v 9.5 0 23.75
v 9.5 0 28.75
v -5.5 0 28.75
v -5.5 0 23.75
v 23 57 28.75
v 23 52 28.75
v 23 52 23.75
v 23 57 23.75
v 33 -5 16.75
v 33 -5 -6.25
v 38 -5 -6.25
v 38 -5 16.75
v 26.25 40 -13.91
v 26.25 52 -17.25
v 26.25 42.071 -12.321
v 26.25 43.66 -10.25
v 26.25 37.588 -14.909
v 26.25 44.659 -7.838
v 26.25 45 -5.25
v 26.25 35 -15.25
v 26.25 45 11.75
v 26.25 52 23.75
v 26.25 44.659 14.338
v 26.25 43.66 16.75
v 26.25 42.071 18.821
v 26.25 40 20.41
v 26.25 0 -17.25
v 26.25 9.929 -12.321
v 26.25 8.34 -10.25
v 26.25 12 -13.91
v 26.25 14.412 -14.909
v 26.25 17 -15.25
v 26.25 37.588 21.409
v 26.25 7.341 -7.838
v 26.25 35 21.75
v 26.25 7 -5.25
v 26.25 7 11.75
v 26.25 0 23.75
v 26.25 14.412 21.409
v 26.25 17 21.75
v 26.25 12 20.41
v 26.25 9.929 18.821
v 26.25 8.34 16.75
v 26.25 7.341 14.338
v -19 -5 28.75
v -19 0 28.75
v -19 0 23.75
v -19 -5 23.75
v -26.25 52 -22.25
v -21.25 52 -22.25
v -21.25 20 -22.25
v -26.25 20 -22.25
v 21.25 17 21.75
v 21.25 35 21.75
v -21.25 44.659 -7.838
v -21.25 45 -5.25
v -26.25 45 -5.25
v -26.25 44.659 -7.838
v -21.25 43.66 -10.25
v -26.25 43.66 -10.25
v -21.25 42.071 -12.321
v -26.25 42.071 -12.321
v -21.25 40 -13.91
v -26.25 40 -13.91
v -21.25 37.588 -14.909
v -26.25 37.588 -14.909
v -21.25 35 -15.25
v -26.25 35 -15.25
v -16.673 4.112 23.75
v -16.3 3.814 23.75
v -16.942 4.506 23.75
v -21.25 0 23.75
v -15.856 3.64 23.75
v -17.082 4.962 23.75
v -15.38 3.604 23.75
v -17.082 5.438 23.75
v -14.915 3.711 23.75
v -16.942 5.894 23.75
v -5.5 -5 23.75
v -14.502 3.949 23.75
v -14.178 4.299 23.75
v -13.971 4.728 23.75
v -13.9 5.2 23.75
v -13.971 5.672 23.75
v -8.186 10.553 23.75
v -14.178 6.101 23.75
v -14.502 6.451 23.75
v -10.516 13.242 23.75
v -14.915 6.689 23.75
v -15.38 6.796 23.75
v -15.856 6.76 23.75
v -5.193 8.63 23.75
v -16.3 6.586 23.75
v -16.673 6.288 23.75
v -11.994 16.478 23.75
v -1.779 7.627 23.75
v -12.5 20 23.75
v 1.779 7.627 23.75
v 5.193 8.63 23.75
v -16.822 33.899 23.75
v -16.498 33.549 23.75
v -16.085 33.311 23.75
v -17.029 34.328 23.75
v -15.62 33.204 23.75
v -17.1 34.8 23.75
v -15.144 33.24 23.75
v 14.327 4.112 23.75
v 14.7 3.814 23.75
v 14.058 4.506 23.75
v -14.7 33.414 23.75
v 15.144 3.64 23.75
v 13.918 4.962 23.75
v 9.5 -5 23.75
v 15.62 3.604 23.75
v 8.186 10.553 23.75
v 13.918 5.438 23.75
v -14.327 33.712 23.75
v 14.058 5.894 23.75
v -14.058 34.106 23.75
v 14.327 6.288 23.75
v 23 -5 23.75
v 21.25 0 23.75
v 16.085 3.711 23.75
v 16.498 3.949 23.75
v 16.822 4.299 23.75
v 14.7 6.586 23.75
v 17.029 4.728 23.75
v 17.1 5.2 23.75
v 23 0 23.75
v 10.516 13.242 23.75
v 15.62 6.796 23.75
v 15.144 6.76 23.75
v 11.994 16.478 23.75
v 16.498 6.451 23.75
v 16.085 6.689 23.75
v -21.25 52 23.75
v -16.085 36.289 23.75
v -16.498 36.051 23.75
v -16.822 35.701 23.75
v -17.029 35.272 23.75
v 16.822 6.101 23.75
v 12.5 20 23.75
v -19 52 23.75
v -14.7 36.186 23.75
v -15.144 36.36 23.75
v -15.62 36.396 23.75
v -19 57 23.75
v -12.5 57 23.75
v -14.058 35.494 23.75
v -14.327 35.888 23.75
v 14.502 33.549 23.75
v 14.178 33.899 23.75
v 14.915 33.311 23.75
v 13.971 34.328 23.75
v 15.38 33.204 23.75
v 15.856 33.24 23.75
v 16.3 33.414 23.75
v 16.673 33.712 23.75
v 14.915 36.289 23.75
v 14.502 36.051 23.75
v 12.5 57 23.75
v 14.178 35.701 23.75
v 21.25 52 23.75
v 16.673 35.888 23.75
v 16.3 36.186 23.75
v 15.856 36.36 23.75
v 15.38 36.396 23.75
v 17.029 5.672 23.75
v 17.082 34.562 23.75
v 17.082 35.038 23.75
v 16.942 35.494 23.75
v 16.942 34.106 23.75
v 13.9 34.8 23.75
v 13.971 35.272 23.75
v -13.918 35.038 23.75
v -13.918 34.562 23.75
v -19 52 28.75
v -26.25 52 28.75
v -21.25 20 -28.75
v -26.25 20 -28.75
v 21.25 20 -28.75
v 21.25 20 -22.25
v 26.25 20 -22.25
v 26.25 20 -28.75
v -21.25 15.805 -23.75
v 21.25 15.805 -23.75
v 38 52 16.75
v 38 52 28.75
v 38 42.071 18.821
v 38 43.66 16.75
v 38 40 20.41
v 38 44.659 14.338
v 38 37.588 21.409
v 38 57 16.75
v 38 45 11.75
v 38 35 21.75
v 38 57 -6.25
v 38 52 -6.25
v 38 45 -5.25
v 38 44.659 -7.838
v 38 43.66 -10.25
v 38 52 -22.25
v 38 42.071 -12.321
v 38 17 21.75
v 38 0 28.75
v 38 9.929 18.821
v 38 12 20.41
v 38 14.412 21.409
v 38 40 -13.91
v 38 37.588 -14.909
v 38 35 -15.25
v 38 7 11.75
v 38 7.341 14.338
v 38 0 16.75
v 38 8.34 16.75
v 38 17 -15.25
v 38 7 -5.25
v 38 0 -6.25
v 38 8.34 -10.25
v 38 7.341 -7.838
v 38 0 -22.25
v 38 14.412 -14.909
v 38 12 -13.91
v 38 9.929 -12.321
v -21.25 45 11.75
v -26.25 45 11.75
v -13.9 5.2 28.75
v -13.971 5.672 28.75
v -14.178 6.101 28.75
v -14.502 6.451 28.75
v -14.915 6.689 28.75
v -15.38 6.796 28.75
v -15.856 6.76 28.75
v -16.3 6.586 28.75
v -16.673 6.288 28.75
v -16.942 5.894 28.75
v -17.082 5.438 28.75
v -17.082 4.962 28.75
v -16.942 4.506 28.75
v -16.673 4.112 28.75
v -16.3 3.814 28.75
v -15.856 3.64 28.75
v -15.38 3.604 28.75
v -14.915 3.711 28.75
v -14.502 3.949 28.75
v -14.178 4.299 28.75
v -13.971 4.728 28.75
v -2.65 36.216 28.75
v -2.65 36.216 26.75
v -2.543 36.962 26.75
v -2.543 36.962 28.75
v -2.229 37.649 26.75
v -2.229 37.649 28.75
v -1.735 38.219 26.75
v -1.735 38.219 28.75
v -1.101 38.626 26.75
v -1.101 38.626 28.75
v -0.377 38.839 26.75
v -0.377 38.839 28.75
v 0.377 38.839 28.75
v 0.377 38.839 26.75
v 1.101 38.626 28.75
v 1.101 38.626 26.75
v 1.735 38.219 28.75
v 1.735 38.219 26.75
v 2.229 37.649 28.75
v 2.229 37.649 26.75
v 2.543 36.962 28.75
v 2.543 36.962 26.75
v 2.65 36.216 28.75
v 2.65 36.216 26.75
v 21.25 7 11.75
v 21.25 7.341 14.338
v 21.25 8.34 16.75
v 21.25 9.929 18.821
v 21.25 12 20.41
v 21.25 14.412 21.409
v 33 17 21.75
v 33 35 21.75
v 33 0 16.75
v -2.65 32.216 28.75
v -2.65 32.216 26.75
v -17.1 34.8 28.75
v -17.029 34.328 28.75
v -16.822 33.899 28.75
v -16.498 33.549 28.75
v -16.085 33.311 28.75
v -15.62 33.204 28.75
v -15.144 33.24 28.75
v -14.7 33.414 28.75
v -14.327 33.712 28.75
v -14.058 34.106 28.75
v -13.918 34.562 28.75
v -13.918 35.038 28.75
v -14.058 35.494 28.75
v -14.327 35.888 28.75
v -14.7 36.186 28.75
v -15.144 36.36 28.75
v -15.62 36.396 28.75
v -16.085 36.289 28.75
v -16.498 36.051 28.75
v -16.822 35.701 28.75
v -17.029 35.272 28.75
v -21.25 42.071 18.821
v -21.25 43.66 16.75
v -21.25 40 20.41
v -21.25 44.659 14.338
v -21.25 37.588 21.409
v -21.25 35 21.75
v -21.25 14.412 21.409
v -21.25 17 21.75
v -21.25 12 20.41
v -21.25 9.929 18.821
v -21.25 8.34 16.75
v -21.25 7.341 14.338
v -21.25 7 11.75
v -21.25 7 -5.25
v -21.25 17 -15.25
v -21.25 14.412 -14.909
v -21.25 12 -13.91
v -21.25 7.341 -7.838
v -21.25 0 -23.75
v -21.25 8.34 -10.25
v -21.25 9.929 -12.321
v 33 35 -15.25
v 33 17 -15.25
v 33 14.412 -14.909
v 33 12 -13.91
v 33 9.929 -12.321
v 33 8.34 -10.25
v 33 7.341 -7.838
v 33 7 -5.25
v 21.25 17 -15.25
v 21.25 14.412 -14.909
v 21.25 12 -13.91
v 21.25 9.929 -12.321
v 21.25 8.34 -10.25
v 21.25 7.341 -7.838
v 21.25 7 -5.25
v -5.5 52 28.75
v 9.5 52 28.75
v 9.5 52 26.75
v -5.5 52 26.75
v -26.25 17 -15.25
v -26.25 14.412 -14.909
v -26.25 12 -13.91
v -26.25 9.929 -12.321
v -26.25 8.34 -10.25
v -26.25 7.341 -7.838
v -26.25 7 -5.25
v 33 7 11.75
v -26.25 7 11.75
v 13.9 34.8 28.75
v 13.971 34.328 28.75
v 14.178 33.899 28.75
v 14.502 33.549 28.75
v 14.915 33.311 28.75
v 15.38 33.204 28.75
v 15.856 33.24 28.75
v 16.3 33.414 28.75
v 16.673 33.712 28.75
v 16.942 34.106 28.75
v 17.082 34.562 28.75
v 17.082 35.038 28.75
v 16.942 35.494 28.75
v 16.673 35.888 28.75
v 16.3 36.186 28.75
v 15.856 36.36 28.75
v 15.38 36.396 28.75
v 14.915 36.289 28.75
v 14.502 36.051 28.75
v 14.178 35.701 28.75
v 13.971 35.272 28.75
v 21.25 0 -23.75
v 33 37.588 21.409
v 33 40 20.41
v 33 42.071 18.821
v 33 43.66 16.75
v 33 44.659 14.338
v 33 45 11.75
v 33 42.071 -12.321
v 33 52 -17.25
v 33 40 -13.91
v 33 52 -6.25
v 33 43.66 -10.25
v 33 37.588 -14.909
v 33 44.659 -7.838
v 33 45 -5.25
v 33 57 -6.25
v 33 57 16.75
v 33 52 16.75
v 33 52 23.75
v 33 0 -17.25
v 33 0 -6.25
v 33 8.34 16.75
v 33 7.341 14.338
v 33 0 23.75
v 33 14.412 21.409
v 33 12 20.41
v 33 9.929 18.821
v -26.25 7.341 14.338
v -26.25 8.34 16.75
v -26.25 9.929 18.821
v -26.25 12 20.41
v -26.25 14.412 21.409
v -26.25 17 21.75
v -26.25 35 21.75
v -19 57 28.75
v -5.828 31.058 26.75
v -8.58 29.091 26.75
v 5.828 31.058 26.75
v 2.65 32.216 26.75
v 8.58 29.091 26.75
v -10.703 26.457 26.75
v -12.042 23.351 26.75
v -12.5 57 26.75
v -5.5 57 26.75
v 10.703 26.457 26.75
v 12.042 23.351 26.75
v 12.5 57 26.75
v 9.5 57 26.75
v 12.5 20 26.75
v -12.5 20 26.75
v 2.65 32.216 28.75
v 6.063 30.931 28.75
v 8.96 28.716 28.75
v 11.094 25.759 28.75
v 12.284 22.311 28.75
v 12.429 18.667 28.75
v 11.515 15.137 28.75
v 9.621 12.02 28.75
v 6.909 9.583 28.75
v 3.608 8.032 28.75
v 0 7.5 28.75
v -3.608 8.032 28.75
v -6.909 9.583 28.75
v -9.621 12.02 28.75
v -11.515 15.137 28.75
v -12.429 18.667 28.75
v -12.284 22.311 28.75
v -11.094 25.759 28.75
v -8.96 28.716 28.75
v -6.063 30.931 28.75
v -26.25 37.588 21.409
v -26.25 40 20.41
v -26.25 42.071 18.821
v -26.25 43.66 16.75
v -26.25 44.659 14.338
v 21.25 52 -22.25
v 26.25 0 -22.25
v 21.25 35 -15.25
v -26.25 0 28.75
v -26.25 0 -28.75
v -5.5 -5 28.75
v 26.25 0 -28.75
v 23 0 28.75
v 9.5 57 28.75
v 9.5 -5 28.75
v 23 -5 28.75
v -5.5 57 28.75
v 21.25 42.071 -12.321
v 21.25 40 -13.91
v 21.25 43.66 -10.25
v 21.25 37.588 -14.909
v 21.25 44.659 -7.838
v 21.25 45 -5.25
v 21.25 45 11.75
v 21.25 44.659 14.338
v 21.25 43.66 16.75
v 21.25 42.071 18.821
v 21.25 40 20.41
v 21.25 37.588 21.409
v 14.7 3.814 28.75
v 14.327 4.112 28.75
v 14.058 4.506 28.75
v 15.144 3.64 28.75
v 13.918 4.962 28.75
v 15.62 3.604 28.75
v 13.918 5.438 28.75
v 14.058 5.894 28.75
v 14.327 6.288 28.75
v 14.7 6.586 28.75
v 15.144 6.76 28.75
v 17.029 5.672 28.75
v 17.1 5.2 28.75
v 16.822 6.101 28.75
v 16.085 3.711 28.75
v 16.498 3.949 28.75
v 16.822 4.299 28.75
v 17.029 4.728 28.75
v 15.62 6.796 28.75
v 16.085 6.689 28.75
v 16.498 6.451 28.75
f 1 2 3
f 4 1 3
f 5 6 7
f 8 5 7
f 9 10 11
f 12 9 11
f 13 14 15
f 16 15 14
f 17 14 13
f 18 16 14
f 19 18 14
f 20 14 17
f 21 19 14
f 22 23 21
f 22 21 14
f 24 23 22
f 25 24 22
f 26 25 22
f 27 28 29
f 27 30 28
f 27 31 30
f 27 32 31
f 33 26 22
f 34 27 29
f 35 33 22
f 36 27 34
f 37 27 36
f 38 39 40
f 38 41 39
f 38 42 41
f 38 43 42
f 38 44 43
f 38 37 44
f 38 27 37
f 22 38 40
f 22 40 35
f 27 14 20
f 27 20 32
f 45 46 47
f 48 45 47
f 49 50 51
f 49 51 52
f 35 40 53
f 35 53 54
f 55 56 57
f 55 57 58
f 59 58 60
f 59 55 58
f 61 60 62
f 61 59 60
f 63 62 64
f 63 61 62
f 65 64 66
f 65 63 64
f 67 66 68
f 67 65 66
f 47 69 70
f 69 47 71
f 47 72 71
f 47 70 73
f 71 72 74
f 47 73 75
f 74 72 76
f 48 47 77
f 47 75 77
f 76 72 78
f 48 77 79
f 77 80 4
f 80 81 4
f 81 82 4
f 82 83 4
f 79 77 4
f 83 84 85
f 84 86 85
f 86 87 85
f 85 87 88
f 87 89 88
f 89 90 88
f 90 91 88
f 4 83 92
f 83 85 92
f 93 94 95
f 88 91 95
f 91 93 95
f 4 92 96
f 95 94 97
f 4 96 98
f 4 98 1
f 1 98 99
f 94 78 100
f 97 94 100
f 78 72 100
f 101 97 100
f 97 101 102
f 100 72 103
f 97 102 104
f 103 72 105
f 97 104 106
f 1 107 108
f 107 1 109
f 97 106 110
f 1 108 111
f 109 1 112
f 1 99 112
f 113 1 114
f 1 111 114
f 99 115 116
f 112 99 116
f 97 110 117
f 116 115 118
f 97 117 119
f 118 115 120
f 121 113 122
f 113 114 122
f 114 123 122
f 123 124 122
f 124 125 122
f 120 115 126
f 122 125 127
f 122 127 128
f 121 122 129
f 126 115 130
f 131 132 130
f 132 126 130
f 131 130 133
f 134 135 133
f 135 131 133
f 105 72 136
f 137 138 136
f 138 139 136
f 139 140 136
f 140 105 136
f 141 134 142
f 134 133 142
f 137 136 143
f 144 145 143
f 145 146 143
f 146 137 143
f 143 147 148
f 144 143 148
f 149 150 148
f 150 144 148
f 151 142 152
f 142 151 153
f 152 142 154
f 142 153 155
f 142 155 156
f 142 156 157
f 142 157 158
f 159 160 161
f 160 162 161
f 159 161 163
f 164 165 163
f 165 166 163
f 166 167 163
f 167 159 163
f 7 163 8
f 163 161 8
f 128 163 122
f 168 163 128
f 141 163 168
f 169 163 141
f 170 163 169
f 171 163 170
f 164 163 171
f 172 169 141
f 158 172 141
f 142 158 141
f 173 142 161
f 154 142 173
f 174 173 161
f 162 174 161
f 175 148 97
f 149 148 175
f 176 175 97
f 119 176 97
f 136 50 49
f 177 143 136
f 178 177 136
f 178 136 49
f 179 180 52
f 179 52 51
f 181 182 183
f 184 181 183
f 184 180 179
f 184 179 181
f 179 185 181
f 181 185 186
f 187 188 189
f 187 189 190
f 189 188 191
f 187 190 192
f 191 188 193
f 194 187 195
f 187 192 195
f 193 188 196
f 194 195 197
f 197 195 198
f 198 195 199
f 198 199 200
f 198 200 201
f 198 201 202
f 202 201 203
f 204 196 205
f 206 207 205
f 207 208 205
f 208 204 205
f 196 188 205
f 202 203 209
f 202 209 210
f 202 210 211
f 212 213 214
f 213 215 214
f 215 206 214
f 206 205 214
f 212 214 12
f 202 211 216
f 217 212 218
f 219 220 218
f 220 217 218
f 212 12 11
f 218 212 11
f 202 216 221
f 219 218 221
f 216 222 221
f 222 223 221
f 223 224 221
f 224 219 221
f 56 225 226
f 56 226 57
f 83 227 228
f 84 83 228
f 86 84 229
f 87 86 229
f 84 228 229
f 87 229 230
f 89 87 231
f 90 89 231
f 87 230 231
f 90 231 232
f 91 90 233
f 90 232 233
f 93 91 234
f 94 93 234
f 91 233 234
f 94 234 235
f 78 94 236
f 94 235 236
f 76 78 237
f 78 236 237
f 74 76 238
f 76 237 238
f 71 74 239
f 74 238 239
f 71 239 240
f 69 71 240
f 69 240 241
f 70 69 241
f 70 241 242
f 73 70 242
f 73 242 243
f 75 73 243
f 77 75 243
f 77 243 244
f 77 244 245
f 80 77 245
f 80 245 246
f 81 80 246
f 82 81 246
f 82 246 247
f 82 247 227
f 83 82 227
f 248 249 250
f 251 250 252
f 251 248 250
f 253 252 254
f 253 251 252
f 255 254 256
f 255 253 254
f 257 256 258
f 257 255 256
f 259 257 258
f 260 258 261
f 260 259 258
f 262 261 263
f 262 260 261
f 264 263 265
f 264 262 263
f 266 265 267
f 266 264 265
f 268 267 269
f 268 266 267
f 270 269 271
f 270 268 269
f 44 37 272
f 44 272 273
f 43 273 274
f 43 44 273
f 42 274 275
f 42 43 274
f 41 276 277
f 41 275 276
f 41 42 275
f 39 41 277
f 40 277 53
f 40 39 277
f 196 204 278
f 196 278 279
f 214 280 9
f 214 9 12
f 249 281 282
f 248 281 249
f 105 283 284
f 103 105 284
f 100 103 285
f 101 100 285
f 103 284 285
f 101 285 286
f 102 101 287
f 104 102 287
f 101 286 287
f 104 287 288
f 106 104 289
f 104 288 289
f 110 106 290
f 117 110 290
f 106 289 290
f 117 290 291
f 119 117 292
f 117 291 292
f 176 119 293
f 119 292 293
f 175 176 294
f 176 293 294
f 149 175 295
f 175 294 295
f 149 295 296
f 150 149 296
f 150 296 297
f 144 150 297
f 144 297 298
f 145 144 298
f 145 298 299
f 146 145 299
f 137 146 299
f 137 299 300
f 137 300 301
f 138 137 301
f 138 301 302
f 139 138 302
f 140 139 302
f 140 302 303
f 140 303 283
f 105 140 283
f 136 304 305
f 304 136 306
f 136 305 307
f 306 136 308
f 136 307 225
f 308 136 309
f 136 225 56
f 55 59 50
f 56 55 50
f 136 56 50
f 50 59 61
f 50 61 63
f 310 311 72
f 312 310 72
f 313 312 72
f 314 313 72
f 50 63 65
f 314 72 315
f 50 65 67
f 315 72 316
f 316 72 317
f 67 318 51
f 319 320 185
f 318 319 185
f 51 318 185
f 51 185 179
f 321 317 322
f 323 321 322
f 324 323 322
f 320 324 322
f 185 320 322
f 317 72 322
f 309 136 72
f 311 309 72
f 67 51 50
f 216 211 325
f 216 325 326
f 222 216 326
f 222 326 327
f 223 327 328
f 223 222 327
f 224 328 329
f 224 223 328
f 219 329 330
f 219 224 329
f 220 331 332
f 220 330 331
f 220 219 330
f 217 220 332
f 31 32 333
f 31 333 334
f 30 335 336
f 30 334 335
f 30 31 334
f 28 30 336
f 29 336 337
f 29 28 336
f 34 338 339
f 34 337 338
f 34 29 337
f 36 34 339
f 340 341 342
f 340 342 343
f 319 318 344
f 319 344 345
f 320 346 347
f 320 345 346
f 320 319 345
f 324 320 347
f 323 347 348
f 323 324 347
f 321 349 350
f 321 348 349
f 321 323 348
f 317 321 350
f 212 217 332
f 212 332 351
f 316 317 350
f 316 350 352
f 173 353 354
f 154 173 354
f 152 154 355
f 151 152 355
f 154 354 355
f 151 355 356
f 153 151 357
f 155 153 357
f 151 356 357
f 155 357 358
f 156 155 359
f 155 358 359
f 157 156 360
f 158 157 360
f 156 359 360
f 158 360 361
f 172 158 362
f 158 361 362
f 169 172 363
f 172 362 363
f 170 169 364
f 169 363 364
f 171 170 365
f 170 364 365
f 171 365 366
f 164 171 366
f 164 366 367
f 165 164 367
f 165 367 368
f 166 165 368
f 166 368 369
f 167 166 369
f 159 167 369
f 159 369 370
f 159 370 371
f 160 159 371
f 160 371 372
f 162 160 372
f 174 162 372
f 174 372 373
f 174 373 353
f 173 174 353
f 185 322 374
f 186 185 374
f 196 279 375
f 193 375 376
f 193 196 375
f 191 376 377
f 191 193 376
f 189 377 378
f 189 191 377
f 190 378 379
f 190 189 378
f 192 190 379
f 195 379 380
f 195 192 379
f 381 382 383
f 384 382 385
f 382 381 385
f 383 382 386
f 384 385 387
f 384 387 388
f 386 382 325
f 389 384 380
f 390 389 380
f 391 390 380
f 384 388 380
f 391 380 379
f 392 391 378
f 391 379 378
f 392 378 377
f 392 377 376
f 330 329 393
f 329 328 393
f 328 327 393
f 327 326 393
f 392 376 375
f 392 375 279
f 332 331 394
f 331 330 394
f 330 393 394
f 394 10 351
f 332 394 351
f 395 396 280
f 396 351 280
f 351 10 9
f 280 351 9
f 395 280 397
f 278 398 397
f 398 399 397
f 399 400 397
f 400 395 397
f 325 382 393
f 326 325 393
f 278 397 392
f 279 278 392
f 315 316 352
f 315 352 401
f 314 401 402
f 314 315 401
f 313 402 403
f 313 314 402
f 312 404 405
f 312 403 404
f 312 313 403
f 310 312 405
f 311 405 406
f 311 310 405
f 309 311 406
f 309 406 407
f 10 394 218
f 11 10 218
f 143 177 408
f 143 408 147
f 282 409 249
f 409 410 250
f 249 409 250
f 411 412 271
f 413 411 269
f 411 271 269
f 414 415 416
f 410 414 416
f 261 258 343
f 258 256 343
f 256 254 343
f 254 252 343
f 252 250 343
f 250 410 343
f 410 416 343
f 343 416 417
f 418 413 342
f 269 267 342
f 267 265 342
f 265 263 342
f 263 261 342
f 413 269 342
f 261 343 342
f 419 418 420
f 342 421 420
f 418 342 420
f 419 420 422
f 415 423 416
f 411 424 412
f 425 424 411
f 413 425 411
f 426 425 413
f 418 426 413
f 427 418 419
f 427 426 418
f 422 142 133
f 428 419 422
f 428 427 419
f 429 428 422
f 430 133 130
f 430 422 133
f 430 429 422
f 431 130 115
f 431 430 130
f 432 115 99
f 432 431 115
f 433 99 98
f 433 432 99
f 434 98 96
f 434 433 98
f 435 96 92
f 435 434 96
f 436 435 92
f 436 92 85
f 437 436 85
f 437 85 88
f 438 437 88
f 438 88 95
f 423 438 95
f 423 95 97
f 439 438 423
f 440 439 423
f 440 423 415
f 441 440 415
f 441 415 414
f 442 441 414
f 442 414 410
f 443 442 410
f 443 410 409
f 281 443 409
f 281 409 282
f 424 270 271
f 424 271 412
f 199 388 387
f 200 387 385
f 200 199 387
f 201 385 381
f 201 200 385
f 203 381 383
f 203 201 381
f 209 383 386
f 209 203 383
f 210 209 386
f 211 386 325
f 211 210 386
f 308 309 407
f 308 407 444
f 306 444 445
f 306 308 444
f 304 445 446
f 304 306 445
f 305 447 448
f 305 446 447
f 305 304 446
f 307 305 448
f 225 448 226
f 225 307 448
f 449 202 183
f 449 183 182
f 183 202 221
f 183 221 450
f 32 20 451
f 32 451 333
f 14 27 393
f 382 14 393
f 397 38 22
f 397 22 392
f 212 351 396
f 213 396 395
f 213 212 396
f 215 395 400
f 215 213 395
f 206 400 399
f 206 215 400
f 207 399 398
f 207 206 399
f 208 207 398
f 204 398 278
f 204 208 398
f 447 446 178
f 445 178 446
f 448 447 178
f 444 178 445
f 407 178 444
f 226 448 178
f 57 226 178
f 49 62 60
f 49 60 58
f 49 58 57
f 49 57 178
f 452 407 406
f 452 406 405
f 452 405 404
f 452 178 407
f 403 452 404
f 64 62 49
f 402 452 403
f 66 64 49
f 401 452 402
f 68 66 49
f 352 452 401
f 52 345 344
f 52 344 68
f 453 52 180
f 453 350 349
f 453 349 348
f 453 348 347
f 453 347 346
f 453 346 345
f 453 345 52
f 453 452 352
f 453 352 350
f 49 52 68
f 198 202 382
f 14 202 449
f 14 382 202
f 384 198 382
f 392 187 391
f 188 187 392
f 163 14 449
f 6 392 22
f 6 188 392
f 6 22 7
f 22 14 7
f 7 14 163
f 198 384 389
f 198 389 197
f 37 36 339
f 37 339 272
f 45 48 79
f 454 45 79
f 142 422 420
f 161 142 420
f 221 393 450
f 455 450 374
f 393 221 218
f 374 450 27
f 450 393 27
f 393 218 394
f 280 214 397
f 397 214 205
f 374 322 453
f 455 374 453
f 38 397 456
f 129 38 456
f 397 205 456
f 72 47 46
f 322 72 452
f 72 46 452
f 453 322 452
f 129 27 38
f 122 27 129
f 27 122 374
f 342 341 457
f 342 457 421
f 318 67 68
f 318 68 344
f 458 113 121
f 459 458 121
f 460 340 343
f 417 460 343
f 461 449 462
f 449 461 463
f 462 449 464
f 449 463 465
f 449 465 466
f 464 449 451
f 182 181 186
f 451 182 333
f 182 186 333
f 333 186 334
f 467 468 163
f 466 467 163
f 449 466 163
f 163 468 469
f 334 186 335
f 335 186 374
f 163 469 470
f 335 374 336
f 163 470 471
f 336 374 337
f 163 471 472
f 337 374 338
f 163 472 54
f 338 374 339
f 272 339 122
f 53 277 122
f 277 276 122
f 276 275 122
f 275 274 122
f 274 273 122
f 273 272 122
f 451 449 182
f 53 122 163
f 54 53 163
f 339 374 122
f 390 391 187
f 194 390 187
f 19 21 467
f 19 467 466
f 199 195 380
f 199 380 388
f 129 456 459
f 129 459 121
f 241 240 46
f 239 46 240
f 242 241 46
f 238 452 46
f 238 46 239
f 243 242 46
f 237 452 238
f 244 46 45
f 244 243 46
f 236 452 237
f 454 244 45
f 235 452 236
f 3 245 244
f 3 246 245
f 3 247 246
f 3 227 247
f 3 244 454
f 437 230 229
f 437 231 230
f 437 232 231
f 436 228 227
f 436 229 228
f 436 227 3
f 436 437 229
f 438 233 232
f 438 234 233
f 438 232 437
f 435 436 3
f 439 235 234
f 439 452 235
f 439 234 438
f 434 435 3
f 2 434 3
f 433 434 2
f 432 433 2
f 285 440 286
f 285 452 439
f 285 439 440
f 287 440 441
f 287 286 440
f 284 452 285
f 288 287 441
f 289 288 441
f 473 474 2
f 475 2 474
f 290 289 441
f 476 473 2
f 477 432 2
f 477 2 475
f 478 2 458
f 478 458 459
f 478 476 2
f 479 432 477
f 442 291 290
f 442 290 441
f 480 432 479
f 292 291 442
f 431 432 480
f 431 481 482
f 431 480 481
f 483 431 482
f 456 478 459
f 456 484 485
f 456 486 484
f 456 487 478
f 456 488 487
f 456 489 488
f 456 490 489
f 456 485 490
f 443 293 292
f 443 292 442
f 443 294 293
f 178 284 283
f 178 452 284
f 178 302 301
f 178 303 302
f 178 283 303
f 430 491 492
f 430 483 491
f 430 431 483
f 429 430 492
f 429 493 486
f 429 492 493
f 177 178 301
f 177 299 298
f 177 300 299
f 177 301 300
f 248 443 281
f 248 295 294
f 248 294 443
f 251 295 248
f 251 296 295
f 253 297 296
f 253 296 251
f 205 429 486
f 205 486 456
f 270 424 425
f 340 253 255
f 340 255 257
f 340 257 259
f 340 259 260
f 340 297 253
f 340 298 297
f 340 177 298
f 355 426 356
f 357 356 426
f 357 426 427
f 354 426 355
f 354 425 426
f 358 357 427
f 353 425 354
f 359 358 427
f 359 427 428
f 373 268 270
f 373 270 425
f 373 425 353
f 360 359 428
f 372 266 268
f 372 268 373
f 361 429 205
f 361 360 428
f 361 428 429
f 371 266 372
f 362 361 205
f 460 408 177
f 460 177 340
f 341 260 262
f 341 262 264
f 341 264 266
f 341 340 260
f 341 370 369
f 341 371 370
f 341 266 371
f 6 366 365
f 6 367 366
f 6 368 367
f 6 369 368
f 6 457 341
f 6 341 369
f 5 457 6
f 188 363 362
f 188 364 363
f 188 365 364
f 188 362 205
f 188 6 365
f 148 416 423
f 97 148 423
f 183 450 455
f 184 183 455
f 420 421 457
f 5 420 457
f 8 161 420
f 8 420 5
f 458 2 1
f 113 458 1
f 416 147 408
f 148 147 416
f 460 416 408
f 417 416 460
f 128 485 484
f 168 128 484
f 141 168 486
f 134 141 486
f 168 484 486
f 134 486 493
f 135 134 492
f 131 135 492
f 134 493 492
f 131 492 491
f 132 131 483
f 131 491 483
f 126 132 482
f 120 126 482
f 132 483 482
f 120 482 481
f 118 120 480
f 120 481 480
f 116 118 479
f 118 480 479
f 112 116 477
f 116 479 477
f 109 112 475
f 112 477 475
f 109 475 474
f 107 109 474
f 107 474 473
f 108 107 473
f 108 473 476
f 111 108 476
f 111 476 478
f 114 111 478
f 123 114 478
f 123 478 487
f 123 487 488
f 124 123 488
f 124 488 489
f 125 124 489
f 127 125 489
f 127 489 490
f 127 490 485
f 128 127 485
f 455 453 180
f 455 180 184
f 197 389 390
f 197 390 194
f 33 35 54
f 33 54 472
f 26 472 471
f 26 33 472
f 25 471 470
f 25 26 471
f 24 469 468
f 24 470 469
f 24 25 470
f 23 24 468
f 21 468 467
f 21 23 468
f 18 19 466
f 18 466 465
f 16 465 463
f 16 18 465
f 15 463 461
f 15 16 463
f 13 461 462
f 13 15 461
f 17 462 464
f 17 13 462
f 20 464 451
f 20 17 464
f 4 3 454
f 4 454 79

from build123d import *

# Parameters (mm, degrees)
ESQUISSE1_W                  = 52.5
ESQUISSE1_H                  = 57.5
ESQUISSE1_W_2                = 42.5
ESQUISSE1_H_2                = 47.5
EXTRU_MINCE1_DEPTH           = 20
ESQUISSE3_W                  = 6.75
ESQUISSE3_H                  = 41
ESQUISSE3_W_2                = 30.75
BOSS_EXTRU_1_DEPTH           = 52
ESQUISSE6_W                  = 5
ESQUISSE6_H                  = 23
ESQUISSE6_W_2                = 13.5
ESQUISSE6_H_2                = 5
BOSS_EXTRU_3_DEPTH           = 5
ENL_V_MAT_EXTRU_1_REACH      = 103.977
ESQUISSE2_R                  = 1.6
ENL_V_START                  = -3
ENL_V_MAT_EXTRU_2_DEPTH      = 3
ENL_V_MAT_EXTRU_3_DEPTH      = 119.640475808
ENL_V_MAT_EXTRU_4_DEPTH      = 99.458112921
ENL_V_MAT_EXTRU_5_DEPTH      = 89.991923791
ENL_V_MAT_EXTRU_5_DEPTH_BACK = 89.991923791
ESQUISSE10_W                 = 35.75
ESQUISSE10_H                 = 51
CHANFREIN1_SIZE2             = 4.195498156
CHANFREIN1_SIZE              = 5


with BuildPart() as part:
    # Esquisse1 → Extru.-Mince1 (new body)
    with BuildSketch(Plane(origin=(0, 0, 0), x_dir=(1, 0, 0), z_dir=(0, 1, 0))):
        Rectangle(ESQUISSE1_W, ESQUISSE1_H)
        Rectangle(ESQUISSE1_W_2, ESQUISSE1_H_2, mode=Mode.SUBTRACT)
    extrude(amount=EXTRU_MINCE1_DEPTH)

    # Esquisse3 → Boss.-Extru.1 (add)
    with BuildSketch(Plane.XZ):
        Polygon((26.25, 28.75), (38, 28.75), (38, -22.25), (21.25, -22.25), (21.25, 23.75), (-21.25, 23.75), (-21.25, -22.25), (-62, -22.25), (-62, 28.75), (-26.25, 28.75), (0, 28.75), align=None)
        with Locations((29.625, 3.25)):
            Rectangle(ESQUISSE3_W, ESQUISSE3_H, mode=Mode.SUBTRACT)
        with Locations((-41.625, 3.25)):
            Rectangle(ESQUISSE3_W_2, ESQUISSE3_H, mode=Mode.SUBTRACT)
    extrude(amount=-BOSS_EXTRU_1_DEPTH)

    # Esquisse6 → Boss.-Extru.3 (add)
    with BuildSketch(Plane(origin=(0, 52, 0), x_dir=(1, 0, 0), z_dir=(0, 1, 0))):
        with Locations((35.5, -5.25)):
            Rectangle(ESQUISSE6_W, ESQUISSE6_H)
        with Locations((16.25, -26.25)):
            Rectangle(ESQUISSE6_W_2, ESQUISSE6_H_2)
        with Locations((-12.25, -26.25)):
            Rectangle(ESQUISSE6_W_2, ESQUISSE6_H_2)
        with Locations((-40.75, -26.25)):
            Rectangle(ESQUISSE6_W_2, ESQUISSE6_H_2)
        with Locations((-40.75, 19.75)):
            Rectangle(ESQUISSE6_W_2, ESQUISSE6_H_2)
        with Locations((-59.5, -5.25)):
            Rectangle(ESQUISSE6_W, ESQUISSE6_H)
    boss_extru_3 = extrude(amount=BOSS_EXTRU_3_DEPTH)

    # Esquisse2 → Enlèv. mat.-Extru.1 (cut, up to next)
    with BuildSketch(Plane.XY.offset(28.75), mode=Mode.PRIVATE) as enl_v_mat_extru_1_sk1:
        with Locations((-15.5, 5.2)):
            Circle(ESQUISSE2_R)
    enl_v_mat_extru_1_tool1 = extrude(enl_v_mat_extru_1_sk1.sketch, amount=-ENL_V_MAT_EXTRU_1_REACH, mode=Mode.PRIVATE) & part.part
    # Esquisse2 → Enlèv. mat.-Extru.1 (cut, up to next)
    with BuildSketch(Plane.XY.offset(28.75), mode=Mode.PRIVATE) as enl_v_mat_extru_1_sk2:
        with Locations((15.5, 5.2)):
            Circle(ESQUISSE2_R)
    enl_v_mat_extru_1_tool2 = extrude(enl_v_mat_extru_1_sk2.sketch, amount=-ENL_V_MAT_EXTRU_1_REACH, mode=Mode.PRIVATE) & part.part
    # Esquisse2 → Enlèv. mat.-Extru.1 (cut, up to next)
    with BuildSketch(Plane.XY.offset(28.75), mode=Mode.PRIVATE) as enl_v_mat_extru_1_sk3:
        with Locations(Location((15.5, 34.8, 0), (0, 0, 180))):
            Circle(ESQUISSE2_R)
    enl_v_mat_extru_1_tool3 = extrude(enl_v_mat_extru_1_sk3.sketch, amount=-ENL_V_MAT_EXTRU_1_REACH, mode=Mode.PRIVATE) & part.part
    # Esquisse2 → Enlèv. mat.-Extru.1 (cut, up to next)
    with BuildSketch(Plane.XY.offset(28.75), mode=Mode.PRIVATE) as enl_v_mat_extru_1_sk4:
        with Locations(Location((-15.5, 34.8, 0), (0, 0, 180))):
            Circle(ESQUISSE2_R)
    enl_v_mat_extru_1_tool4 = extrude(enl_v_mat_extru_1_sk4.sketch, amount=-ENL_V_MAT_EXTRU_1_REACH, mode=Mode.PRIVATE) & part.part
    # Esquisse2 → Enlèv. mat.-Extru.1 (cut, up to next)
    with BuildSketch(Plane.XY.offset(28.75), mode=Mode.PRIVATE) as enl_v_mat_extru_1_sk5:
        with BuildLine():
            Line((2.65, 36.215870824), (2.65, 32.215870824))
            ThreePointArc((2.65, 32.215870824), (0, 7.5), (-2.65, 32.215870824))
            Line((-2.65, 32.215870824), (-2.65, 36.215870824))
            ThreePointArc((-2.65, 36.215870824), (0, 38.865870824), (2.65, 36.215870824))
        make_face()
    enl_v_mat_extru_1_tool5 = extrude(enl_v_mat_extru_1_sk5.sketch, amount=-ENL_V_MAT_EXTRU_1_REACH, mode=Mode.PRIVATE) & part.part
    add(enl_v_mat_extru_1_tool1.solids().sort_by_distance((-15.5, 5.2, 28.75))[0], mode=Mode.SUBTRACT)
    add(enl_v_mat_extru_1_tool2.solids().sort_by_distance((15.5, 5.2, 28.75))[0], mode=Mode.SUBTRACT)
    add(enl_v_mat_extru_1_tool3.solids().sort_by_distance((15.5, 34.8, 28.75))[0], mode=Mode.SUBTRACT)
    add(enl_v_mat_extru_1_tool4.solids().sort_by_distance((-15.5, 34.8, 28.75))[0], mode=Mode.SUBTRACT)
    add(enl_v_mat_extru_1_tool5.solids().sort_by_distance((0, 20.91985, 28.75))[0], mode=Mode.SUBTRACT)

    # Esquisse4 → Enlèv. mat.-Extru.2 (cut)
    with BuildSketch(Plane(origin=(0, 0, 23.75), x_dir=(-1, 0, 0), z_dir=(0, 0, -1)).offset(ENL_V_START)):
        with BuildLine():
            Line((-12.5, 20), (-12.5, 57))
            Line((-12.5, 57), (12.5, 57))
            Line((12.5, 57), (12.5, 20))
            ThreePointArc((12.5, 20), (0, 32.5), (-12.5, 20))
        make_face()
    extrude(amount=ENL_V_MAT_EXTRU_2_DEPTH, mode=Mode.SUBTRACT)

    # Symétrie1: Boss.-Extru.3 across plane
    add(boss_extru_3.mirror(Plane(origin=(0, 26, 0), x_dir=(0, 0, 1), z_dir=(0, -1, 0))))

    # Esquisse7 → Enlèv. mat.-Extru.3 (cut, through all)
    with BuildSketch(Plane(origin=(38, 0, 0), x_dir=(0, 0, -1), z_dir=(1, 0, 0))):
        with BuildLine():
            Line((-11.75, 45), (5.25, 45))
            ThreePointArc((5.25, 45), (12.321067812, 42.071067812), (15.25, 35))
            Line((15.25, 35), (15.25, 17))
            ThreePointArc((15.25, 17), (12.321067812, 9.928932188), (5.25, 7))
            Line((5.25, 7), (-11.75, 7))
            ThreePointArc((-11.75, 7), (-18.821067812, 9.928932188), (-21.75, 17))
            Line((-21.75, 17), (-21.75, 35))
            ThreePointArc((-21.75, 35), (-18.821067812, 42.071067812), (-11.75, 45))
        make_face()
    extrude(amount=-ENL_V_MAT_EXTRU_3_DEPTH, mode=Mode.SUBTRACT)

    # Esquisse8 → Enlèv. mat.-Extru.4 (cut, through all)
    with BuildSketch(Plane(origin=(0, 0, -22.25), x_dir=(-1, 0, 0), z_dir=(0, 0, -1))):
        with BuildLine():
            Line((48.625, 33.5), (48.625, 18.5))
            ThreePointArc((48.625, 18.5), (41.625, 11.5), (34.625, 18.5))
            Line((34.625, 18.5), (34.625, 33.5))
            ThreePointArc((34.625, 33.5), (41.625, 40.5), (48.625, 33.5))
        make_face()
    extrude(amount=-ENL_V_MAT_EXTRU_4_DEPTH, mode=Mode.SUBTRACT)

    # Esquisse10 → Enlèv. mat.-Extru.5 (cut, two sides: drawn at the far end of the back side and taken through both)
    with BuildSketch(Plane(origin=(0, 52, 0), x_dir=(1, 0, 0), z_dir=(0, 1, 0)).offset(-ENL_V_MAT_EXTRU_5_DEPTH_BACK)):
        with Locations((-44.125, -3.25)):
            Rectangle(ESQUISSE10_W, ESQUISSE10_H)
    extrude(amount=ENL_V_MAT_EXTRU_5_DEPTH + ENL_V_MAT_EXTRU_5_DEPTH_BACK, mode=Mode.SUBTRACT)

    # Chanfrein1
    chanfrein1_edges = [part.edges().sort_by_distance(p)[0] for p in [
        (0, 20, -23.75),
    ]]
    chanfrein1_side = [part.faces().sort_by_distance(p)[0] for p in [
        (0, 20, -23.833909963),
    ]]
    chamfer(chanfrein1_edges, length=CHANFREIN1_SIZE - 0.0001, length2=CHANFREIN1_SIZE2 - 0.0001, reference=chanfrein1_side[0])  # a hair under: the kernel refuses the full size


solid = part.part
